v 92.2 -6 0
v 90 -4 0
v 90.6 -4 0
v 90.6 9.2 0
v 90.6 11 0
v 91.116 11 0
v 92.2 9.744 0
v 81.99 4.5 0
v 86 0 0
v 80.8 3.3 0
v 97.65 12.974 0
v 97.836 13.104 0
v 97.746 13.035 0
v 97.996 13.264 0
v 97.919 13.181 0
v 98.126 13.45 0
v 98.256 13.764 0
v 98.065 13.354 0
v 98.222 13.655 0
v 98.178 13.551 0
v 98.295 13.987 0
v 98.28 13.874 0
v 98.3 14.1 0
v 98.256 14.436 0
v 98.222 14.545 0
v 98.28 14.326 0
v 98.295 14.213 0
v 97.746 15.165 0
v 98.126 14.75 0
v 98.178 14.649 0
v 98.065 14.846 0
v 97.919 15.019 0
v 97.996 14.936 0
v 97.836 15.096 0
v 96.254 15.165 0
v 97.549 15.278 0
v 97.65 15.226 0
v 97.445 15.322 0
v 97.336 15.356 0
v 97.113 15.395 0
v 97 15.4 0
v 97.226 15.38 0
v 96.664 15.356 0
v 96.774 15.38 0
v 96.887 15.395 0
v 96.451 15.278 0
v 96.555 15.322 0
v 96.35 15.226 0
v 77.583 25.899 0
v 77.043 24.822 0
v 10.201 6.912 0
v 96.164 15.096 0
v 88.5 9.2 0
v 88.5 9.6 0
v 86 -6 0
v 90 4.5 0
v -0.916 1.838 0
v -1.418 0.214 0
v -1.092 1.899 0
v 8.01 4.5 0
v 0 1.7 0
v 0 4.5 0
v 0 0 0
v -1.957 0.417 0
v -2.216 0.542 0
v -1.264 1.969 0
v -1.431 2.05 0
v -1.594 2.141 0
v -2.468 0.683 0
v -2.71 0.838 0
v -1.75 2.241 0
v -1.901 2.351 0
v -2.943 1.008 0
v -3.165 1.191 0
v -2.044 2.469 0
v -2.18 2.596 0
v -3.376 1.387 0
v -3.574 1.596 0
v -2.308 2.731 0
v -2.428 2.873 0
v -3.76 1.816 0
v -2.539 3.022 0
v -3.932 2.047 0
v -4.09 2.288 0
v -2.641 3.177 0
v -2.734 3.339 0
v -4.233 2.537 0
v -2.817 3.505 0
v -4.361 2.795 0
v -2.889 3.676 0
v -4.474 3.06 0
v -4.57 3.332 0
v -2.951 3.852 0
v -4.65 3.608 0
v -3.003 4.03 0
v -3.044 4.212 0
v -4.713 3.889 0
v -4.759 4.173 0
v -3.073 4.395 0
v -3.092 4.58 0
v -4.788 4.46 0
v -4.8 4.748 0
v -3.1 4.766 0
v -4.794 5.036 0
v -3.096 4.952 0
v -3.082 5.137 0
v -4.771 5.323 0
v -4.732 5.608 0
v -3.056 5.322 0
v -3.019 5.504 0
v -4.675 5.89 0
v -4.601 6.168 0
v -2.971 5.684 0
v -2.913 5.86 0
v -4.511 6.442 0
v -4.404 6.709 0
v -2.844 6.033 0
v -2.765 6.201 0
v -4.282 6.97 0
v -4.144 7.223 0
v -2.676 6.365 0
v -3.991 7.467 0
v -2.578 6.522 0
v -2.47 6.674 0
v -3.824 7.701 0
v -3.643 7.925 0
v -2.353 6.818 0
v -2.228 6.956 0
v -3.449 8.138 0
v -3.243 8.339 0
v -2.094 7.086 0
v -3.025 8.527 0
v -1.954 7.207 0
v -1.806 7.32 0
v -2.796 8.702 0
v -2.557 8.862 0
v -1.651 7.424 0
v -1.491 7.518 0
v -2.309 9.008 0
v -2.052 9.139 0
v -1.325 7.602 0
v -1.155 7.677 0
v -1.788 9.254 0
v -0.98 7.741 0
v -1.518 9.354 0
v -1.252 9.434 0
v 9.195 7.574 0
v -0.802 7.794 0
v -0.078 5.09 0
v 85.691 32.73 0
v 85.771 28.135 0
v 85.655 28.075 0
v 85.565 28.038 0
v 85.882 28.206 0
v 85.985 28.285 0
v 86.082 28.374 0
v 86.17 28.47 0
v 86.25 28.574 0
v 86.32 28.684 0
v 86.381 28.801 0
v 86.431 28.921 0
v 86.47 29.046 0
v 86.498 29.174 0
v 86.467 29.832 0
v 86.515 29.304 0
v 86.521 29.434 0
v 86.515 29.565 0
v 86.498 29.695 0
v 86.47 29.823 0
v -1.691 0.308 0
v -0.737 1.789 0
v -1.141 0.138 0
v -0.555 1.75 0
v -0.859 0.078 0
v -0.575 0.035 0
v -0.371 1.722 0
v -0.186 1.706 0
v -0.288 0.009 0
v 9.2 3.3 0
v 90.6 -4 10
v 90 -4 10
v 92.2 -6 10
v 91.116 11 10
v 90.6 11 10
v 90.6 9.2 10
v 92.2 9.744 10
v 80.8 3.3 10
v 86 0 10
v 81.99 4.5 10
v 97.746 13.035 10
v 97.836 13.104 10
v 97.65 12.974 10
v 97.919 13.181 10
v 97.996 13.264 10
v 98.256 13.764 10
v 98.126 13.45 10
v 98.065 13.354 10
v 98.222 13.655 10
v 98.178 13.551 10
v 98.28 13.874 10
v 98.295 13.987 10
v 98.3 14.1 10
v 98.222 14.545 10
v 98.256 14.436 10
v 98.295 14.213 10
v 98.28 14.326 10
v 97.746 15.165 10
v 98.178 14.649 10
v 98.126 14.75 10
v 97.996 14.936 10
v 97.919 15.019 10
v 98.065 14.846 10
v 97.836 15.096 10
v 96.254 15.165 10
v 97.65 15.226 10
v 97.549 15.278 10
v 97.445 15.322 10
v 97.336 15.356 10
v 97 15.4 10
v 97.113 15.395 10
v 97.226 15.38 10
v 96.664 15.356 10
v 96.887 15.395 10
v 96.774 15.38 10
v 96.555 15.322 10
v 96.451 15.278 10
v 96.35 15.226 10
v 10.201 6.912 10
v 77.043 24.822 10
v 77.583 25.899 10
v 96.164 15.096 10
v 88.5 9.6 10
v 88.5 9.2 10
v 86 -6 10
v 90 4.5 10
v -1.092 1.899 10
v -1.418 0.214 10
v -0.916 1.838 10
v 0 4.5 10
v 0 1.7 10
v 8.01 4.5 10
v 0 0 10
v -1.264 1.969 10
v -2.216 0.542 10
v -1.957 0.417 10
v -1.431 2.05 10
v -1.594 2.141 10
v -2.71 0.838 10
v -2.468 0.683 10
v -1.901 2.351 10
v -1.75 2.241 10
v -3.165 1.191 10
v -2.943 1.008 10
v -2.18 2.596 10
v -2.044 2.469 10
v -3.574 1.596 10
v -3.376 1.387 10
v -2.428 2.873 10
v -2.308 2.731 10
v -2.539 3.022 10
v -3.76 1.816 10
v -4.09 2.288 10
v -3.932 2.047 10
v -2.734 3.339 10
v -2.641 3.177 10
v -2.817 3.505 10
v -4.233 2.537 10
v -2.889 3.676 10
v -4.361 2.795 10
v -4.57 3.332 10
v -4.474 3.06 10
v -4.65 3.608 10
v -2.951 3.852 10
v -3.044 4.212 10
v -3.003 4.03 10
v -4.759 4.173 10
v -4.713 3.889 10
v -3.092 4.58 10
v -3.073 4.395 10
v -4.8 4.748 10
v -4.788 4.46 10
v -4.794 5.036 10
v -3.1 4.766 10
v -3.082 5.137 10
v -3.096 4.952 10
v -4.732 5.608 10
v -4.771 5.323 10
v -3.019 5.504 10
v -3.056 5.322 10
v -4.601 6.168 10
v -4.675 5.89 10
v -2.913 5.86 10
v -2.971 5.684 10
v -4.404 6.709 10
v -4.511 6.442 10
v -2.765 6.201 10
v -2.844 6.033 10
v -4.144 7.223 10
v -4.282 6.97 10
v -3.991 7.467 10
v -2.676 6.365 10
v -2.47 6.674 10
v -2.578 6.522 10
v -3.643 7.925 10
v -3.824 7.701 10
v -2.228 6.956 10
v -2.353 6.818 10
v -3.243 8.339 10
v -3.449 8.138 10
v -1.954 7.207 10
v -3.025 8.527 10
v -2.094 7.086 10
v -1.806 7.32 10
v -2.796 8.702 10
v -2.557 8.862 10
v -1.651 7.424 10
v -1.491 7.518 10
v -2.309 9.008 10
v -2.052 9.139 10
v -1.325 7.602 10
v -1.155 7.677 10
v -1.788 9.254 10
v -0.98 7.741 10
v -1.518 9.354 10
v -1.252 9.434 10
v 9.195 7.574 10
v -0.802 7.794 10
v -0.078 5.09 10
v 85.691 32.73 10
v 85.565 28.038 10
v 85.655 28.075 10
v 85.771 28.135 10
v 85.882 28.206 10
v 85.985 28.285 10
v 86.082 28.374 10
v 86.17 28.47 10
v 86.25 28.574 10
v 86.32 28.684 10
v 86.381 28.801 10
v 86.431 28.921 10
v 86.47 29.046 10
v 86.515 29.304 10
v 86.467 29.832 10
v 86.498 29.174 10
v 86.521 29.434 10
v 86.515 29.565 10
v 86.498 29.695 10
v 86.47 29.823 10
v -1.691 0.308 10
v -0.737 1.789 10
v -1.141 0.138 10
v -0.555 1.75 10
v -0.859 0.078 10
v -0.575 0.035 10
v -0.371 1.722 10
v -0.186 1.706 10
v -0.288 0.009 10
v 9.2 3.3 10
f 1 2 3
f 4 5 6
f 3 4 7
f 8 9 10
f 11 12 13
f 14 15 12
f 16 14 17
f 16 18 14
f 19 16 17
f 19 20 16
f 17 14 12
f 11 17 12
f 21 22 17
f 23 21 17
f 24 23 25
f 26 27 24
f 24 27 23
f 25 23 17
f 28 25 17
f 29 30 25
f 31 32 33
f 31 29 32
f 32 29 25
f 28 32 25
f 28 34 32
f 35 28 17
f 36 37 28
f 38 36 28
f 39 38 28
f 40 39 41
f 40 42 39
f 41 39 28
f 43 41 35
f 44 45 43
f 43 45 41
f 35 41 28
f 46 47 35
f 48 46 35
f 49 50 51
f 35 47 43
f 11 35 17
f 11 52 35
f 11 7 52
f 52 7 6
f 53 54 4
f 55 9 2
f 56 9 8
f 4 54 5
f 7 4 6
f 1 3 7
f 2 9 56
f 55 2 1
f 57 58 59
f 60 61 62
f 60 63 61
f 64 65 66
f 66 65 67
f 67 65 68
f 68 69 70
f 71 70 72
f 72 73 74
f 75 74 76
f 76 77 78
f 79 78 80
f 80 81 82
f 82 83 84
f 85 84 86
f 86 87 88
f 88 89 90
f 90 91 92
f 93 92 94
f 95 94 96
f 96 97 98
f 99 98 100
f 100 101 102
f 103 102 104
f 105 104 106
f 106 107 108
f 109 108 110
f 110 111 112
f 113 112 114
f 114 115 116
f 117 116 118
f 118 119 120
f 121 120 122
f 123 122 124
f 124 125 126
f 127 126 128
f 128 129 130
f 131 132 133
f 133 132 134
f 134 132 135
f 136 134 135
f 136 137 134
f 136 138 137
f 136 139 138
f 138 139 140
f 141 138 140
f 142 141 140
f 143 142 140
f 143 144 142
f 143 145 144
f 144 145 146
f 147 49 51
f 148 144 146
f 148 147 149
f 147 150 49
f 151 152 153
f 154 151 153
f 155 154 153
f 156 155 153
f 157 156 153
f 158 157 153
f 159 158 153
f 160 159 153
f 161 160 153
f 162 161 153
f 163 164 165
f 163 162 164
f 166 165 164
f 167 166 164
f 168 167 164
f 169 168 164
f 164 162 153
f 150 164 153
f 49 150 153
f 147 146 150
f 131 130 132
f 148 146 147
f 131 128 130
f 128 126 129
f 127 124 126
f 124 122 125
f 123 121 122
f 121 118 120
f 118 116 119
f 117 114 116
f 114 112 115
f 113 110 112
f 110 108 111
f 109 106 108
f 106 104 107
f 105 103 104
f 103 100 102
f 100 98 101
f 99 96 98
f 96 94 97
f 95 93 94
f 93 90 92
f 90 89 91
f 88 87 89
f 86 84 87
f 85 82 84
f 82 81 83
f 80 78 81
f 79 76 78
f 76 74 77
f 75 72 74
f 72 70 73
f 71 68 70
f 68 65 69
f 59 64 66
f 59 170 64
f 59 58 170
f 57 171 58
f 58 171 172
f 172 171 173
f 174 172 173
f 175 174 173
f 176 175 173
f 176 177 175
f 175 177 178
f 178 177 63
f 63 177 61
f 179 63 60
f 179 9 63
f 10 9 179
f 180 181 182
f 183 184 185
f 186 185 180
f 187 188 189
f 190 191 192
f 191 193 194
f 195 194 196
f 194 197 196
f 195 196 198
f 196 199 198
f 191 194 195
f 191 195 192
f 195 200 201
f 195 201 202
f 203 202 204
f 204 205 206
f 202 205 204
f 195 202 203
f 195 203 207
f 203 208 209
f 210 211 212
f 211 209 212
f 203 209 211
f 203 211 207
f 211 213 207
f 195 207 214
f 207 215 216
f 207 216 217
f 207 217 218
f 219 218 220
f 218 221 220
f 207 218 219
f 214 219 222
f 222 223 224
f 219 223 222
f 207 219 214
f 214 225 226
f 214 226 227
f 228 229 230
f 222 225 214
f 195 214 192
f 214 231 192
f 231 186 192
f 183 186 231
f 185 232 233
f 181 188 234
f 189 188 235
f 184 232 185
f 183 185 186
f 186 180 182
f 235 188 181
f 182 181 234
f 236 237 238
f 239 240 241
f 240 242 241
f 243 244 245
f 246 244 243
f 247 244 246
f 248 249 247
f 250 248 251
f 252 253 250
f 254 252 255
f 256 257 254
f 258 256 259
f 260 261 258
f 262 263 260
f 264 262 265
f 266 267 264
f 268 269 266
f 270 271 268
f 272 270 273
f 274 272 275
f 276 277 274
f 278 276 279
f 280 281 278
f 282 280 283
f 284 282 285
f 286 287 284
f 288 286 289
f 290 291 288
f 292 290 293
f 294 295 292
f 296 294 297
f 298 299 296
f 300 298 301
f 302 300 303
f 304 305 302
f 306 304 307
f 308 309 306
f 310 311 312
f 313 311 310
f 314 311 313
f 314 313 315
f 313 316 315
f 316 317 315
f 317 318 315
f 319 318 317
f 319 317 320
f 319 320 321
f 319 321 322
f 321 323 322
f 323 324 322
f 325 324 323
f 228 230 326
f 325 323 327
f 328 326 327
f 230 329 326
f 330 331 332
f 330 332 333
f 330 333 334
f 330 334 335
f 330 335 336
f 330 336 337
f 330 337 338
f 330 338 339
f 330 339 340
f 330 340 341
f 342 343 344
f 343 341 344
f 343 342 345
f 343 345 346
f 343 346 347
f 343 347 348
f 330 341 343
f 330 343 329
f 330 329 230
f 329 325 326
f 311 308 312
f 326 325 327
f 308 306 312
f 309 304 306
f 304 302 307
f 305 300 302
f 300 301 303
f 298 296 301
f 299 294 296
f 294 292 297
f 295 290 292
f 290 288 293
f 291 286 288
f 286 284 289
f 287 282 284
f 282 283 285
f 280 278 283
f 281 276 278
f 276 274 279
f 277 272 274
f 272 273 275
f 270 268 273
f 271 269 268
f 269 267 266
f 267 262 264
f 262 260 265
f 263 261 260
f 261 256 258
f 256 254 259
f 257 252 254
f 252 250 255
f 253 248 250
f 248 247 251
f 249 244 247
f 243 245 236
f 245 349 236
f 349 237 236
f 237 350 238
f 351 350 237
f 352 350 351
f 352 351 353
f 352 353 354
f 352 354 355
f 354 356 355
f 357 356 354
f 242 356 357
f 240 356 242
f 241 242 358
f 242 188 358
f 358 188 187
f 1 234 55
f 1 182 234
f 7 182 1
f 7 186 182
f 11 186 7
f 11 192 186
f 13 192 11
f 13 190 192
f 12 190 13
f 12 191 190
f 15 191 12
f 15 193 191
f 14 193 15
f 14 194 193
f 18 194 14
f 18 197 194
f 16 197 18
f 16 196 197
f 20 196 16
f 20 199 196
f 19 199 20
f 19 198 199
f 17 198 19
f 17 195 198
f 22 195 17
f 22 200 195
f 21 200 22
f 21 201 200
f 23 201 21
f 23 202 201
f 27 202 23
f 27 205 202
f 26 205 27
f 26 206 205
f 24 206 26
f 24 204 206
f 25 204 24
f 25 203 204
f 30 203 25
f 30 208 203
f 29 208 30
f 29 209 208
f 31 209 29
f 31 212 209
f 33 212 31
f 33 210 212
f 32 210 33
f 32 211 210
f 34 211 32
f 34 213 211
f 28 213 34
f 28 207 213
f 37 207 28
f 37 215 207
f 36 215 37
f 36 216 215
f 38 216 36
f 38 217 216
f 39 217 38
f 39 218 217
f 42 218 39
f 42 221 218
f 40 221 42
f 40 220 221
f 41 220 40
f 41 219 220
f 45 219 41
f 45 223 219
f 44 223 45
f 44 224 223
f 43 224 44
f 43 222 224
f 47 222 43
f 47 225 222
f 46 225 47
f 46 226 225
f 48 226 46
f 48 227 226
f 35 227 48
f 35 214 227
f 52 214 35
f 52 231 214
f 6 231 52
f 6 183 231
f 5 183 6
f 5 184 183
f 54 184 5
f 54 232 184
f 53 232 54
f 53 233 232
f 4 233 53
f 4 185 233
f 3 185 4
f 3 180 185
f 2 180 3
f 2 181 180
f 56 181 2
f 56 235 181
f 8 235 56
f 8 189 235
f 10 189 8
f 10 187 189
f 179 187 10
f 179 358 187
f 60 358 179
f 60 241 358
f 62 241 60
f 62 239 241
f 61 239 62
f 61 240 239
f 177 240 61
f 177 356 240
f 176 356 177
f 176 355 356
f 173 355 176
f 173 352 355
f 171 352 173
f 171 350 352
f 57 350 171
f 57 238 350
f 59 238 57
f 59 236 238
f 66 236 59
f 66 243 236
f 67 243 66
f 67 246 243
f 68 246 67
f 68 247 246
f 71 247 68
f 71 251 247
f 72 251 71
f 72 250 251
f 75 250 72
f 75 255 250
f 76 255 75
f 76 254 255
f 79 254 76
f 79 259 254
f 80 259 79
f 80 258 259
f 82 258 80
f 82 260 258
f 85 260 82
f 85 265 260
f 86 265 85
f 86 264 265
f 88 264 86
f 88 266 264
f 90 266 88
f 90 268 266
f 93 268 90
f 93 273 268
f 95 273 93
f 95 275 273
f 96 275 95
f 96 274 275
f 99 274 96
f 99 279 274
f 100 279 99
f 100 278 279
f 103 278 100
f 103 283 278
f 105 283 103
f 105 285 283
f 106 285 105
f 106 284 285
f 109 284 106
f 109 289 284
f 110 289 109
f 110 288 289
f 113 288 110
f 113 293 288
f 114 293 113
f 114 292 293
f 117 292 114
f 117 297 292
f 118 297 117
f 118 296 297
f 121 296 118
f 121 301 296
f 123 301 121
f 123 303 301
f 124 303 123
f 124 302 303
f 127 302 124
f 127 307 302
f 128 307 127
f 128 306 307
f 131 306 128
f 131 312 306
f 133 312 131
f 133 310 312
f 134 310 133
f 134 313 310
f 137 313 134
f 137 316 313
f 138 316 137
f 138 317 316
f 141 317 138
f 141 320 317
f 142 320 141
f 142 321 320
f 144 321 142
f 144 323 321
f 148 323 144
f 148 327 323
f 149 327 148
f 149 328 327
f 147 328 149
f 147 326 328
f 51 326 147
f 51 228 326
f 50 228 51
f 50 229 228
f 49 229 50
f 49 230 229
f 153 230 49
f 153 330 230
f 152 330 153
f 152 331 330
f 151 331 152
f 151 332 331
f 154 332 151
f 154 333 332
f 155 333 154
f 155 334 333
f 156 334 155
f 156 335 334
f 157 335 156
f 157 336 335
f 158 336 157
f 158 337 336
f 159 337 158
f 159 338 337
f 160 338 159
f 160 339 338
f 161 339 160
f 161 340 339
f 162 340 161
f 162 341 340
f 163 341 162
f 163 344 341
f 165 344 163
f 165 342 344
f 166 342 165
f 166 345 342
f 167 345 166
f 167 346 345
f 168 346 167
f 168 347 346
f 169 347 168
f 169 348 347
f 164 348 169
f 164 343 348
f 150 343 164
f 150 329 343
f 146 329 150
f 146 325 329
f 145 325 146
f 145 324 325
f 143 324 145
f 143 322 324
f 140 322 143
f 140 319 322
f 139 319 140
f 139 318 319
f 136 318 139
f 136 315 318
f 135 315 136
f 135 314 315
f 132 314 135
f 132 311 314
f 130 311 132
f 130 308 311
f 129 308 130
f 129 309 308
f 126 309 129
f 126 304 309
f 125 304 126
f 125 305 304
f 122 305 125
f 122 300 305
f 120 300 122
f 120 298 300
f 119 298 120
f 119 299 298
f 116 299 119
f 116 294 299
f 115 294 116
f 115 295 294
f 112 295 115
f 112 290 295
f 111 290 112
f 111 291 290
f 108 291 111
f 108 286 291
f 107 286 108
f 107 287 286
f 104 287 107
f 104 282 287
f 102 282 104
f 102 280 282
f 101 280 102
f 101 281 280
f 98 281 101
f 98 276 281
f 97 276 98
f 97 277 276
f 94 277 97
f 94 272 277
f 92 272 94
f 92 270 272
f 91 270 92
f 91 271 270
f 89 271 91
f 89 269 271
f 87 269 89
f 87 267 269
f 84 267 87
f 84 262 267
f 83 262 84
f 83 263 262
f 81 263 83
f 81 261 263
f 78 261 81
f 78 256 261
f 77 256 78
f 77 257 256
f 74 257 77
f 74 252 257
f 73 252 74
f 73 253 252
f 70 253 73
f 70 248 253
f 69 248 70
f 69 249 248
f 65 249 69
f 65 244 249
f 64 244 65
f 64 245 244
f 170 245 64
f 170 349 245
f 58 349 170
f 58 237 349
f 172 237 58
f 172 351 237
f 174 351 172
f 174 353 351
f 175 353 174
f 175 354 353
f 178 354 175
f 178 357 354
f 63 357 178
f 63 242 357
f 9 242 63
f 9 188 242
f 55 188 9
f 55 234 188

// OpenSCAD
// Chip bag clip (idea #14, 2026-11-12, V2 built in). One piece, no hinge pin, no supports.
// - Printed OPEN (top jaw 15 deg up) so the latch lip never overlaps the jaw; the round
//   flex loop is the hinge (no pin to wear out).
// - Ridge on the top jaw into a groove in the bottom jaw: bag is pinched in a zigzag, won't slide.
// - U-spring snap latch pulls the jaws 0.4 mm past the print gap (preload); flick the thumb tab out to open.
// - Rounded jaw tips (no bag snags), chamfered lip = press-to-close ramp.
// Prints flat (profile in XY, 10 mm tall): layers run along the loop, so the hinge flexes
// across strands, not between layers. PETG.
//   p3d slice chip_clip.stl --walls 4 --infill 40 --keep-orient
$fn = 72;
part = "one";      // "set" (60/90/120 + 90) | "one"
L    = 90;         // jaw length for part="one"
H    = 10;         // clip height (print Z)
T    = 4.5;        // jaw thickness
G    = 0.6;        // jaw gap as printed (closed pose)
pre  = 0.4;        // latch preload
w    = 1.7;        // hinge loop wall
th   = 15;         // print-open angle
ym   = T + G / 2;  // hinge centre height
yt   = 2 * T + G;  // top of top jaw (closed)

module bottom_jaw(L) {
  difference() {
    union() {
      square([L, T]);
      // U-spring latch: stub down, foot, long bar up (17 mm flex length, ~1.3 % strain)
      translate([L - 4, -6]) square([4, 6 + 0.01]);
      translate([L - 4, -6]) square([L + 2.2 - (L - 4), 2]);
      translate([L + 0.6, -6]) square([1.6, yt + 7.4]);
      // lip: 1.5 mm catch over the jaw tip, ramp on top = press to close
      polygon([[L - 1.5, yt - pre], [L + 2.2, yt - pre], [L + 2.2, yt + 1.4],
               [L + 0.6, yt + 1.4], [L - 1.5, yt]]);
      // thumb tab: flick out to open
      hull() {
        translate([L + 1.4, yt + 0.6]) circle(0.8);
        translate([L + 7, yt + 4.5]) circle(1.3);
      }
    }
    // V groove (bag zigzag)
    translate([8, T]) polygon([[0, 0.01], [L - 16, 0.01], [L - 17.2, -1.2], [1.2, -1.2]]);
  }
}

module top_jaw(L) {      // tip stays square on top (latch seat), rounded underneath
  difference() {
    union() {
      translate([0, T + G]) square([L, T]);
      translate([9, T + G]) polygon([[0.6, 0], [L - 18.6, 0], [L - 19.4, -0.9], [1.4, -0.9]]);
    }
    translate([L - 1.5, T + G - 0.01]) difference() { square(1.51); translate([0, 1.5]) circle(1.5); }
  }
}

module arc(r0, r1, a0, a1) {     // annulus sector, a0 -> a1 degrees
  n = 48;
  polygon(concat([for (i = [0:n]) let(a = a0 + (a1 - a0) * i / n) [r1 * cos(a), r1 * sin(a)]],
                 [for (i = [n:-1:0]) let(a = a0 + (a1 - a0) * i / n) [r0 * cos(a), r0 * sin(a)]]));
}

module clip2d(L) {
  translate([0, ym]) {
    arc(ym - w, ym, 90 + th, 270);                                   // flex loop / hang hole
    translate([0, -ym]) bottom_jaw(L);
    rotate(th) translate([0, -ym]) top_jaw(L);
    rotate(th) translate([-0.01, ym - w]) square([1.5, w]);         // loop -> top jaw joint
  }
}

module clip(L) linear_extrude(H) clip2d(L);

if (part == "one") clip(L);
else {
  // longest first; jaws open up, nested with 6 mm gaps
  Ls = [120, 90, 90, 60];
  for (i = [0:len(Ls) - 1]) translate([-60, -85 + i * 44, 0]) clip(Ls[i]);
}
